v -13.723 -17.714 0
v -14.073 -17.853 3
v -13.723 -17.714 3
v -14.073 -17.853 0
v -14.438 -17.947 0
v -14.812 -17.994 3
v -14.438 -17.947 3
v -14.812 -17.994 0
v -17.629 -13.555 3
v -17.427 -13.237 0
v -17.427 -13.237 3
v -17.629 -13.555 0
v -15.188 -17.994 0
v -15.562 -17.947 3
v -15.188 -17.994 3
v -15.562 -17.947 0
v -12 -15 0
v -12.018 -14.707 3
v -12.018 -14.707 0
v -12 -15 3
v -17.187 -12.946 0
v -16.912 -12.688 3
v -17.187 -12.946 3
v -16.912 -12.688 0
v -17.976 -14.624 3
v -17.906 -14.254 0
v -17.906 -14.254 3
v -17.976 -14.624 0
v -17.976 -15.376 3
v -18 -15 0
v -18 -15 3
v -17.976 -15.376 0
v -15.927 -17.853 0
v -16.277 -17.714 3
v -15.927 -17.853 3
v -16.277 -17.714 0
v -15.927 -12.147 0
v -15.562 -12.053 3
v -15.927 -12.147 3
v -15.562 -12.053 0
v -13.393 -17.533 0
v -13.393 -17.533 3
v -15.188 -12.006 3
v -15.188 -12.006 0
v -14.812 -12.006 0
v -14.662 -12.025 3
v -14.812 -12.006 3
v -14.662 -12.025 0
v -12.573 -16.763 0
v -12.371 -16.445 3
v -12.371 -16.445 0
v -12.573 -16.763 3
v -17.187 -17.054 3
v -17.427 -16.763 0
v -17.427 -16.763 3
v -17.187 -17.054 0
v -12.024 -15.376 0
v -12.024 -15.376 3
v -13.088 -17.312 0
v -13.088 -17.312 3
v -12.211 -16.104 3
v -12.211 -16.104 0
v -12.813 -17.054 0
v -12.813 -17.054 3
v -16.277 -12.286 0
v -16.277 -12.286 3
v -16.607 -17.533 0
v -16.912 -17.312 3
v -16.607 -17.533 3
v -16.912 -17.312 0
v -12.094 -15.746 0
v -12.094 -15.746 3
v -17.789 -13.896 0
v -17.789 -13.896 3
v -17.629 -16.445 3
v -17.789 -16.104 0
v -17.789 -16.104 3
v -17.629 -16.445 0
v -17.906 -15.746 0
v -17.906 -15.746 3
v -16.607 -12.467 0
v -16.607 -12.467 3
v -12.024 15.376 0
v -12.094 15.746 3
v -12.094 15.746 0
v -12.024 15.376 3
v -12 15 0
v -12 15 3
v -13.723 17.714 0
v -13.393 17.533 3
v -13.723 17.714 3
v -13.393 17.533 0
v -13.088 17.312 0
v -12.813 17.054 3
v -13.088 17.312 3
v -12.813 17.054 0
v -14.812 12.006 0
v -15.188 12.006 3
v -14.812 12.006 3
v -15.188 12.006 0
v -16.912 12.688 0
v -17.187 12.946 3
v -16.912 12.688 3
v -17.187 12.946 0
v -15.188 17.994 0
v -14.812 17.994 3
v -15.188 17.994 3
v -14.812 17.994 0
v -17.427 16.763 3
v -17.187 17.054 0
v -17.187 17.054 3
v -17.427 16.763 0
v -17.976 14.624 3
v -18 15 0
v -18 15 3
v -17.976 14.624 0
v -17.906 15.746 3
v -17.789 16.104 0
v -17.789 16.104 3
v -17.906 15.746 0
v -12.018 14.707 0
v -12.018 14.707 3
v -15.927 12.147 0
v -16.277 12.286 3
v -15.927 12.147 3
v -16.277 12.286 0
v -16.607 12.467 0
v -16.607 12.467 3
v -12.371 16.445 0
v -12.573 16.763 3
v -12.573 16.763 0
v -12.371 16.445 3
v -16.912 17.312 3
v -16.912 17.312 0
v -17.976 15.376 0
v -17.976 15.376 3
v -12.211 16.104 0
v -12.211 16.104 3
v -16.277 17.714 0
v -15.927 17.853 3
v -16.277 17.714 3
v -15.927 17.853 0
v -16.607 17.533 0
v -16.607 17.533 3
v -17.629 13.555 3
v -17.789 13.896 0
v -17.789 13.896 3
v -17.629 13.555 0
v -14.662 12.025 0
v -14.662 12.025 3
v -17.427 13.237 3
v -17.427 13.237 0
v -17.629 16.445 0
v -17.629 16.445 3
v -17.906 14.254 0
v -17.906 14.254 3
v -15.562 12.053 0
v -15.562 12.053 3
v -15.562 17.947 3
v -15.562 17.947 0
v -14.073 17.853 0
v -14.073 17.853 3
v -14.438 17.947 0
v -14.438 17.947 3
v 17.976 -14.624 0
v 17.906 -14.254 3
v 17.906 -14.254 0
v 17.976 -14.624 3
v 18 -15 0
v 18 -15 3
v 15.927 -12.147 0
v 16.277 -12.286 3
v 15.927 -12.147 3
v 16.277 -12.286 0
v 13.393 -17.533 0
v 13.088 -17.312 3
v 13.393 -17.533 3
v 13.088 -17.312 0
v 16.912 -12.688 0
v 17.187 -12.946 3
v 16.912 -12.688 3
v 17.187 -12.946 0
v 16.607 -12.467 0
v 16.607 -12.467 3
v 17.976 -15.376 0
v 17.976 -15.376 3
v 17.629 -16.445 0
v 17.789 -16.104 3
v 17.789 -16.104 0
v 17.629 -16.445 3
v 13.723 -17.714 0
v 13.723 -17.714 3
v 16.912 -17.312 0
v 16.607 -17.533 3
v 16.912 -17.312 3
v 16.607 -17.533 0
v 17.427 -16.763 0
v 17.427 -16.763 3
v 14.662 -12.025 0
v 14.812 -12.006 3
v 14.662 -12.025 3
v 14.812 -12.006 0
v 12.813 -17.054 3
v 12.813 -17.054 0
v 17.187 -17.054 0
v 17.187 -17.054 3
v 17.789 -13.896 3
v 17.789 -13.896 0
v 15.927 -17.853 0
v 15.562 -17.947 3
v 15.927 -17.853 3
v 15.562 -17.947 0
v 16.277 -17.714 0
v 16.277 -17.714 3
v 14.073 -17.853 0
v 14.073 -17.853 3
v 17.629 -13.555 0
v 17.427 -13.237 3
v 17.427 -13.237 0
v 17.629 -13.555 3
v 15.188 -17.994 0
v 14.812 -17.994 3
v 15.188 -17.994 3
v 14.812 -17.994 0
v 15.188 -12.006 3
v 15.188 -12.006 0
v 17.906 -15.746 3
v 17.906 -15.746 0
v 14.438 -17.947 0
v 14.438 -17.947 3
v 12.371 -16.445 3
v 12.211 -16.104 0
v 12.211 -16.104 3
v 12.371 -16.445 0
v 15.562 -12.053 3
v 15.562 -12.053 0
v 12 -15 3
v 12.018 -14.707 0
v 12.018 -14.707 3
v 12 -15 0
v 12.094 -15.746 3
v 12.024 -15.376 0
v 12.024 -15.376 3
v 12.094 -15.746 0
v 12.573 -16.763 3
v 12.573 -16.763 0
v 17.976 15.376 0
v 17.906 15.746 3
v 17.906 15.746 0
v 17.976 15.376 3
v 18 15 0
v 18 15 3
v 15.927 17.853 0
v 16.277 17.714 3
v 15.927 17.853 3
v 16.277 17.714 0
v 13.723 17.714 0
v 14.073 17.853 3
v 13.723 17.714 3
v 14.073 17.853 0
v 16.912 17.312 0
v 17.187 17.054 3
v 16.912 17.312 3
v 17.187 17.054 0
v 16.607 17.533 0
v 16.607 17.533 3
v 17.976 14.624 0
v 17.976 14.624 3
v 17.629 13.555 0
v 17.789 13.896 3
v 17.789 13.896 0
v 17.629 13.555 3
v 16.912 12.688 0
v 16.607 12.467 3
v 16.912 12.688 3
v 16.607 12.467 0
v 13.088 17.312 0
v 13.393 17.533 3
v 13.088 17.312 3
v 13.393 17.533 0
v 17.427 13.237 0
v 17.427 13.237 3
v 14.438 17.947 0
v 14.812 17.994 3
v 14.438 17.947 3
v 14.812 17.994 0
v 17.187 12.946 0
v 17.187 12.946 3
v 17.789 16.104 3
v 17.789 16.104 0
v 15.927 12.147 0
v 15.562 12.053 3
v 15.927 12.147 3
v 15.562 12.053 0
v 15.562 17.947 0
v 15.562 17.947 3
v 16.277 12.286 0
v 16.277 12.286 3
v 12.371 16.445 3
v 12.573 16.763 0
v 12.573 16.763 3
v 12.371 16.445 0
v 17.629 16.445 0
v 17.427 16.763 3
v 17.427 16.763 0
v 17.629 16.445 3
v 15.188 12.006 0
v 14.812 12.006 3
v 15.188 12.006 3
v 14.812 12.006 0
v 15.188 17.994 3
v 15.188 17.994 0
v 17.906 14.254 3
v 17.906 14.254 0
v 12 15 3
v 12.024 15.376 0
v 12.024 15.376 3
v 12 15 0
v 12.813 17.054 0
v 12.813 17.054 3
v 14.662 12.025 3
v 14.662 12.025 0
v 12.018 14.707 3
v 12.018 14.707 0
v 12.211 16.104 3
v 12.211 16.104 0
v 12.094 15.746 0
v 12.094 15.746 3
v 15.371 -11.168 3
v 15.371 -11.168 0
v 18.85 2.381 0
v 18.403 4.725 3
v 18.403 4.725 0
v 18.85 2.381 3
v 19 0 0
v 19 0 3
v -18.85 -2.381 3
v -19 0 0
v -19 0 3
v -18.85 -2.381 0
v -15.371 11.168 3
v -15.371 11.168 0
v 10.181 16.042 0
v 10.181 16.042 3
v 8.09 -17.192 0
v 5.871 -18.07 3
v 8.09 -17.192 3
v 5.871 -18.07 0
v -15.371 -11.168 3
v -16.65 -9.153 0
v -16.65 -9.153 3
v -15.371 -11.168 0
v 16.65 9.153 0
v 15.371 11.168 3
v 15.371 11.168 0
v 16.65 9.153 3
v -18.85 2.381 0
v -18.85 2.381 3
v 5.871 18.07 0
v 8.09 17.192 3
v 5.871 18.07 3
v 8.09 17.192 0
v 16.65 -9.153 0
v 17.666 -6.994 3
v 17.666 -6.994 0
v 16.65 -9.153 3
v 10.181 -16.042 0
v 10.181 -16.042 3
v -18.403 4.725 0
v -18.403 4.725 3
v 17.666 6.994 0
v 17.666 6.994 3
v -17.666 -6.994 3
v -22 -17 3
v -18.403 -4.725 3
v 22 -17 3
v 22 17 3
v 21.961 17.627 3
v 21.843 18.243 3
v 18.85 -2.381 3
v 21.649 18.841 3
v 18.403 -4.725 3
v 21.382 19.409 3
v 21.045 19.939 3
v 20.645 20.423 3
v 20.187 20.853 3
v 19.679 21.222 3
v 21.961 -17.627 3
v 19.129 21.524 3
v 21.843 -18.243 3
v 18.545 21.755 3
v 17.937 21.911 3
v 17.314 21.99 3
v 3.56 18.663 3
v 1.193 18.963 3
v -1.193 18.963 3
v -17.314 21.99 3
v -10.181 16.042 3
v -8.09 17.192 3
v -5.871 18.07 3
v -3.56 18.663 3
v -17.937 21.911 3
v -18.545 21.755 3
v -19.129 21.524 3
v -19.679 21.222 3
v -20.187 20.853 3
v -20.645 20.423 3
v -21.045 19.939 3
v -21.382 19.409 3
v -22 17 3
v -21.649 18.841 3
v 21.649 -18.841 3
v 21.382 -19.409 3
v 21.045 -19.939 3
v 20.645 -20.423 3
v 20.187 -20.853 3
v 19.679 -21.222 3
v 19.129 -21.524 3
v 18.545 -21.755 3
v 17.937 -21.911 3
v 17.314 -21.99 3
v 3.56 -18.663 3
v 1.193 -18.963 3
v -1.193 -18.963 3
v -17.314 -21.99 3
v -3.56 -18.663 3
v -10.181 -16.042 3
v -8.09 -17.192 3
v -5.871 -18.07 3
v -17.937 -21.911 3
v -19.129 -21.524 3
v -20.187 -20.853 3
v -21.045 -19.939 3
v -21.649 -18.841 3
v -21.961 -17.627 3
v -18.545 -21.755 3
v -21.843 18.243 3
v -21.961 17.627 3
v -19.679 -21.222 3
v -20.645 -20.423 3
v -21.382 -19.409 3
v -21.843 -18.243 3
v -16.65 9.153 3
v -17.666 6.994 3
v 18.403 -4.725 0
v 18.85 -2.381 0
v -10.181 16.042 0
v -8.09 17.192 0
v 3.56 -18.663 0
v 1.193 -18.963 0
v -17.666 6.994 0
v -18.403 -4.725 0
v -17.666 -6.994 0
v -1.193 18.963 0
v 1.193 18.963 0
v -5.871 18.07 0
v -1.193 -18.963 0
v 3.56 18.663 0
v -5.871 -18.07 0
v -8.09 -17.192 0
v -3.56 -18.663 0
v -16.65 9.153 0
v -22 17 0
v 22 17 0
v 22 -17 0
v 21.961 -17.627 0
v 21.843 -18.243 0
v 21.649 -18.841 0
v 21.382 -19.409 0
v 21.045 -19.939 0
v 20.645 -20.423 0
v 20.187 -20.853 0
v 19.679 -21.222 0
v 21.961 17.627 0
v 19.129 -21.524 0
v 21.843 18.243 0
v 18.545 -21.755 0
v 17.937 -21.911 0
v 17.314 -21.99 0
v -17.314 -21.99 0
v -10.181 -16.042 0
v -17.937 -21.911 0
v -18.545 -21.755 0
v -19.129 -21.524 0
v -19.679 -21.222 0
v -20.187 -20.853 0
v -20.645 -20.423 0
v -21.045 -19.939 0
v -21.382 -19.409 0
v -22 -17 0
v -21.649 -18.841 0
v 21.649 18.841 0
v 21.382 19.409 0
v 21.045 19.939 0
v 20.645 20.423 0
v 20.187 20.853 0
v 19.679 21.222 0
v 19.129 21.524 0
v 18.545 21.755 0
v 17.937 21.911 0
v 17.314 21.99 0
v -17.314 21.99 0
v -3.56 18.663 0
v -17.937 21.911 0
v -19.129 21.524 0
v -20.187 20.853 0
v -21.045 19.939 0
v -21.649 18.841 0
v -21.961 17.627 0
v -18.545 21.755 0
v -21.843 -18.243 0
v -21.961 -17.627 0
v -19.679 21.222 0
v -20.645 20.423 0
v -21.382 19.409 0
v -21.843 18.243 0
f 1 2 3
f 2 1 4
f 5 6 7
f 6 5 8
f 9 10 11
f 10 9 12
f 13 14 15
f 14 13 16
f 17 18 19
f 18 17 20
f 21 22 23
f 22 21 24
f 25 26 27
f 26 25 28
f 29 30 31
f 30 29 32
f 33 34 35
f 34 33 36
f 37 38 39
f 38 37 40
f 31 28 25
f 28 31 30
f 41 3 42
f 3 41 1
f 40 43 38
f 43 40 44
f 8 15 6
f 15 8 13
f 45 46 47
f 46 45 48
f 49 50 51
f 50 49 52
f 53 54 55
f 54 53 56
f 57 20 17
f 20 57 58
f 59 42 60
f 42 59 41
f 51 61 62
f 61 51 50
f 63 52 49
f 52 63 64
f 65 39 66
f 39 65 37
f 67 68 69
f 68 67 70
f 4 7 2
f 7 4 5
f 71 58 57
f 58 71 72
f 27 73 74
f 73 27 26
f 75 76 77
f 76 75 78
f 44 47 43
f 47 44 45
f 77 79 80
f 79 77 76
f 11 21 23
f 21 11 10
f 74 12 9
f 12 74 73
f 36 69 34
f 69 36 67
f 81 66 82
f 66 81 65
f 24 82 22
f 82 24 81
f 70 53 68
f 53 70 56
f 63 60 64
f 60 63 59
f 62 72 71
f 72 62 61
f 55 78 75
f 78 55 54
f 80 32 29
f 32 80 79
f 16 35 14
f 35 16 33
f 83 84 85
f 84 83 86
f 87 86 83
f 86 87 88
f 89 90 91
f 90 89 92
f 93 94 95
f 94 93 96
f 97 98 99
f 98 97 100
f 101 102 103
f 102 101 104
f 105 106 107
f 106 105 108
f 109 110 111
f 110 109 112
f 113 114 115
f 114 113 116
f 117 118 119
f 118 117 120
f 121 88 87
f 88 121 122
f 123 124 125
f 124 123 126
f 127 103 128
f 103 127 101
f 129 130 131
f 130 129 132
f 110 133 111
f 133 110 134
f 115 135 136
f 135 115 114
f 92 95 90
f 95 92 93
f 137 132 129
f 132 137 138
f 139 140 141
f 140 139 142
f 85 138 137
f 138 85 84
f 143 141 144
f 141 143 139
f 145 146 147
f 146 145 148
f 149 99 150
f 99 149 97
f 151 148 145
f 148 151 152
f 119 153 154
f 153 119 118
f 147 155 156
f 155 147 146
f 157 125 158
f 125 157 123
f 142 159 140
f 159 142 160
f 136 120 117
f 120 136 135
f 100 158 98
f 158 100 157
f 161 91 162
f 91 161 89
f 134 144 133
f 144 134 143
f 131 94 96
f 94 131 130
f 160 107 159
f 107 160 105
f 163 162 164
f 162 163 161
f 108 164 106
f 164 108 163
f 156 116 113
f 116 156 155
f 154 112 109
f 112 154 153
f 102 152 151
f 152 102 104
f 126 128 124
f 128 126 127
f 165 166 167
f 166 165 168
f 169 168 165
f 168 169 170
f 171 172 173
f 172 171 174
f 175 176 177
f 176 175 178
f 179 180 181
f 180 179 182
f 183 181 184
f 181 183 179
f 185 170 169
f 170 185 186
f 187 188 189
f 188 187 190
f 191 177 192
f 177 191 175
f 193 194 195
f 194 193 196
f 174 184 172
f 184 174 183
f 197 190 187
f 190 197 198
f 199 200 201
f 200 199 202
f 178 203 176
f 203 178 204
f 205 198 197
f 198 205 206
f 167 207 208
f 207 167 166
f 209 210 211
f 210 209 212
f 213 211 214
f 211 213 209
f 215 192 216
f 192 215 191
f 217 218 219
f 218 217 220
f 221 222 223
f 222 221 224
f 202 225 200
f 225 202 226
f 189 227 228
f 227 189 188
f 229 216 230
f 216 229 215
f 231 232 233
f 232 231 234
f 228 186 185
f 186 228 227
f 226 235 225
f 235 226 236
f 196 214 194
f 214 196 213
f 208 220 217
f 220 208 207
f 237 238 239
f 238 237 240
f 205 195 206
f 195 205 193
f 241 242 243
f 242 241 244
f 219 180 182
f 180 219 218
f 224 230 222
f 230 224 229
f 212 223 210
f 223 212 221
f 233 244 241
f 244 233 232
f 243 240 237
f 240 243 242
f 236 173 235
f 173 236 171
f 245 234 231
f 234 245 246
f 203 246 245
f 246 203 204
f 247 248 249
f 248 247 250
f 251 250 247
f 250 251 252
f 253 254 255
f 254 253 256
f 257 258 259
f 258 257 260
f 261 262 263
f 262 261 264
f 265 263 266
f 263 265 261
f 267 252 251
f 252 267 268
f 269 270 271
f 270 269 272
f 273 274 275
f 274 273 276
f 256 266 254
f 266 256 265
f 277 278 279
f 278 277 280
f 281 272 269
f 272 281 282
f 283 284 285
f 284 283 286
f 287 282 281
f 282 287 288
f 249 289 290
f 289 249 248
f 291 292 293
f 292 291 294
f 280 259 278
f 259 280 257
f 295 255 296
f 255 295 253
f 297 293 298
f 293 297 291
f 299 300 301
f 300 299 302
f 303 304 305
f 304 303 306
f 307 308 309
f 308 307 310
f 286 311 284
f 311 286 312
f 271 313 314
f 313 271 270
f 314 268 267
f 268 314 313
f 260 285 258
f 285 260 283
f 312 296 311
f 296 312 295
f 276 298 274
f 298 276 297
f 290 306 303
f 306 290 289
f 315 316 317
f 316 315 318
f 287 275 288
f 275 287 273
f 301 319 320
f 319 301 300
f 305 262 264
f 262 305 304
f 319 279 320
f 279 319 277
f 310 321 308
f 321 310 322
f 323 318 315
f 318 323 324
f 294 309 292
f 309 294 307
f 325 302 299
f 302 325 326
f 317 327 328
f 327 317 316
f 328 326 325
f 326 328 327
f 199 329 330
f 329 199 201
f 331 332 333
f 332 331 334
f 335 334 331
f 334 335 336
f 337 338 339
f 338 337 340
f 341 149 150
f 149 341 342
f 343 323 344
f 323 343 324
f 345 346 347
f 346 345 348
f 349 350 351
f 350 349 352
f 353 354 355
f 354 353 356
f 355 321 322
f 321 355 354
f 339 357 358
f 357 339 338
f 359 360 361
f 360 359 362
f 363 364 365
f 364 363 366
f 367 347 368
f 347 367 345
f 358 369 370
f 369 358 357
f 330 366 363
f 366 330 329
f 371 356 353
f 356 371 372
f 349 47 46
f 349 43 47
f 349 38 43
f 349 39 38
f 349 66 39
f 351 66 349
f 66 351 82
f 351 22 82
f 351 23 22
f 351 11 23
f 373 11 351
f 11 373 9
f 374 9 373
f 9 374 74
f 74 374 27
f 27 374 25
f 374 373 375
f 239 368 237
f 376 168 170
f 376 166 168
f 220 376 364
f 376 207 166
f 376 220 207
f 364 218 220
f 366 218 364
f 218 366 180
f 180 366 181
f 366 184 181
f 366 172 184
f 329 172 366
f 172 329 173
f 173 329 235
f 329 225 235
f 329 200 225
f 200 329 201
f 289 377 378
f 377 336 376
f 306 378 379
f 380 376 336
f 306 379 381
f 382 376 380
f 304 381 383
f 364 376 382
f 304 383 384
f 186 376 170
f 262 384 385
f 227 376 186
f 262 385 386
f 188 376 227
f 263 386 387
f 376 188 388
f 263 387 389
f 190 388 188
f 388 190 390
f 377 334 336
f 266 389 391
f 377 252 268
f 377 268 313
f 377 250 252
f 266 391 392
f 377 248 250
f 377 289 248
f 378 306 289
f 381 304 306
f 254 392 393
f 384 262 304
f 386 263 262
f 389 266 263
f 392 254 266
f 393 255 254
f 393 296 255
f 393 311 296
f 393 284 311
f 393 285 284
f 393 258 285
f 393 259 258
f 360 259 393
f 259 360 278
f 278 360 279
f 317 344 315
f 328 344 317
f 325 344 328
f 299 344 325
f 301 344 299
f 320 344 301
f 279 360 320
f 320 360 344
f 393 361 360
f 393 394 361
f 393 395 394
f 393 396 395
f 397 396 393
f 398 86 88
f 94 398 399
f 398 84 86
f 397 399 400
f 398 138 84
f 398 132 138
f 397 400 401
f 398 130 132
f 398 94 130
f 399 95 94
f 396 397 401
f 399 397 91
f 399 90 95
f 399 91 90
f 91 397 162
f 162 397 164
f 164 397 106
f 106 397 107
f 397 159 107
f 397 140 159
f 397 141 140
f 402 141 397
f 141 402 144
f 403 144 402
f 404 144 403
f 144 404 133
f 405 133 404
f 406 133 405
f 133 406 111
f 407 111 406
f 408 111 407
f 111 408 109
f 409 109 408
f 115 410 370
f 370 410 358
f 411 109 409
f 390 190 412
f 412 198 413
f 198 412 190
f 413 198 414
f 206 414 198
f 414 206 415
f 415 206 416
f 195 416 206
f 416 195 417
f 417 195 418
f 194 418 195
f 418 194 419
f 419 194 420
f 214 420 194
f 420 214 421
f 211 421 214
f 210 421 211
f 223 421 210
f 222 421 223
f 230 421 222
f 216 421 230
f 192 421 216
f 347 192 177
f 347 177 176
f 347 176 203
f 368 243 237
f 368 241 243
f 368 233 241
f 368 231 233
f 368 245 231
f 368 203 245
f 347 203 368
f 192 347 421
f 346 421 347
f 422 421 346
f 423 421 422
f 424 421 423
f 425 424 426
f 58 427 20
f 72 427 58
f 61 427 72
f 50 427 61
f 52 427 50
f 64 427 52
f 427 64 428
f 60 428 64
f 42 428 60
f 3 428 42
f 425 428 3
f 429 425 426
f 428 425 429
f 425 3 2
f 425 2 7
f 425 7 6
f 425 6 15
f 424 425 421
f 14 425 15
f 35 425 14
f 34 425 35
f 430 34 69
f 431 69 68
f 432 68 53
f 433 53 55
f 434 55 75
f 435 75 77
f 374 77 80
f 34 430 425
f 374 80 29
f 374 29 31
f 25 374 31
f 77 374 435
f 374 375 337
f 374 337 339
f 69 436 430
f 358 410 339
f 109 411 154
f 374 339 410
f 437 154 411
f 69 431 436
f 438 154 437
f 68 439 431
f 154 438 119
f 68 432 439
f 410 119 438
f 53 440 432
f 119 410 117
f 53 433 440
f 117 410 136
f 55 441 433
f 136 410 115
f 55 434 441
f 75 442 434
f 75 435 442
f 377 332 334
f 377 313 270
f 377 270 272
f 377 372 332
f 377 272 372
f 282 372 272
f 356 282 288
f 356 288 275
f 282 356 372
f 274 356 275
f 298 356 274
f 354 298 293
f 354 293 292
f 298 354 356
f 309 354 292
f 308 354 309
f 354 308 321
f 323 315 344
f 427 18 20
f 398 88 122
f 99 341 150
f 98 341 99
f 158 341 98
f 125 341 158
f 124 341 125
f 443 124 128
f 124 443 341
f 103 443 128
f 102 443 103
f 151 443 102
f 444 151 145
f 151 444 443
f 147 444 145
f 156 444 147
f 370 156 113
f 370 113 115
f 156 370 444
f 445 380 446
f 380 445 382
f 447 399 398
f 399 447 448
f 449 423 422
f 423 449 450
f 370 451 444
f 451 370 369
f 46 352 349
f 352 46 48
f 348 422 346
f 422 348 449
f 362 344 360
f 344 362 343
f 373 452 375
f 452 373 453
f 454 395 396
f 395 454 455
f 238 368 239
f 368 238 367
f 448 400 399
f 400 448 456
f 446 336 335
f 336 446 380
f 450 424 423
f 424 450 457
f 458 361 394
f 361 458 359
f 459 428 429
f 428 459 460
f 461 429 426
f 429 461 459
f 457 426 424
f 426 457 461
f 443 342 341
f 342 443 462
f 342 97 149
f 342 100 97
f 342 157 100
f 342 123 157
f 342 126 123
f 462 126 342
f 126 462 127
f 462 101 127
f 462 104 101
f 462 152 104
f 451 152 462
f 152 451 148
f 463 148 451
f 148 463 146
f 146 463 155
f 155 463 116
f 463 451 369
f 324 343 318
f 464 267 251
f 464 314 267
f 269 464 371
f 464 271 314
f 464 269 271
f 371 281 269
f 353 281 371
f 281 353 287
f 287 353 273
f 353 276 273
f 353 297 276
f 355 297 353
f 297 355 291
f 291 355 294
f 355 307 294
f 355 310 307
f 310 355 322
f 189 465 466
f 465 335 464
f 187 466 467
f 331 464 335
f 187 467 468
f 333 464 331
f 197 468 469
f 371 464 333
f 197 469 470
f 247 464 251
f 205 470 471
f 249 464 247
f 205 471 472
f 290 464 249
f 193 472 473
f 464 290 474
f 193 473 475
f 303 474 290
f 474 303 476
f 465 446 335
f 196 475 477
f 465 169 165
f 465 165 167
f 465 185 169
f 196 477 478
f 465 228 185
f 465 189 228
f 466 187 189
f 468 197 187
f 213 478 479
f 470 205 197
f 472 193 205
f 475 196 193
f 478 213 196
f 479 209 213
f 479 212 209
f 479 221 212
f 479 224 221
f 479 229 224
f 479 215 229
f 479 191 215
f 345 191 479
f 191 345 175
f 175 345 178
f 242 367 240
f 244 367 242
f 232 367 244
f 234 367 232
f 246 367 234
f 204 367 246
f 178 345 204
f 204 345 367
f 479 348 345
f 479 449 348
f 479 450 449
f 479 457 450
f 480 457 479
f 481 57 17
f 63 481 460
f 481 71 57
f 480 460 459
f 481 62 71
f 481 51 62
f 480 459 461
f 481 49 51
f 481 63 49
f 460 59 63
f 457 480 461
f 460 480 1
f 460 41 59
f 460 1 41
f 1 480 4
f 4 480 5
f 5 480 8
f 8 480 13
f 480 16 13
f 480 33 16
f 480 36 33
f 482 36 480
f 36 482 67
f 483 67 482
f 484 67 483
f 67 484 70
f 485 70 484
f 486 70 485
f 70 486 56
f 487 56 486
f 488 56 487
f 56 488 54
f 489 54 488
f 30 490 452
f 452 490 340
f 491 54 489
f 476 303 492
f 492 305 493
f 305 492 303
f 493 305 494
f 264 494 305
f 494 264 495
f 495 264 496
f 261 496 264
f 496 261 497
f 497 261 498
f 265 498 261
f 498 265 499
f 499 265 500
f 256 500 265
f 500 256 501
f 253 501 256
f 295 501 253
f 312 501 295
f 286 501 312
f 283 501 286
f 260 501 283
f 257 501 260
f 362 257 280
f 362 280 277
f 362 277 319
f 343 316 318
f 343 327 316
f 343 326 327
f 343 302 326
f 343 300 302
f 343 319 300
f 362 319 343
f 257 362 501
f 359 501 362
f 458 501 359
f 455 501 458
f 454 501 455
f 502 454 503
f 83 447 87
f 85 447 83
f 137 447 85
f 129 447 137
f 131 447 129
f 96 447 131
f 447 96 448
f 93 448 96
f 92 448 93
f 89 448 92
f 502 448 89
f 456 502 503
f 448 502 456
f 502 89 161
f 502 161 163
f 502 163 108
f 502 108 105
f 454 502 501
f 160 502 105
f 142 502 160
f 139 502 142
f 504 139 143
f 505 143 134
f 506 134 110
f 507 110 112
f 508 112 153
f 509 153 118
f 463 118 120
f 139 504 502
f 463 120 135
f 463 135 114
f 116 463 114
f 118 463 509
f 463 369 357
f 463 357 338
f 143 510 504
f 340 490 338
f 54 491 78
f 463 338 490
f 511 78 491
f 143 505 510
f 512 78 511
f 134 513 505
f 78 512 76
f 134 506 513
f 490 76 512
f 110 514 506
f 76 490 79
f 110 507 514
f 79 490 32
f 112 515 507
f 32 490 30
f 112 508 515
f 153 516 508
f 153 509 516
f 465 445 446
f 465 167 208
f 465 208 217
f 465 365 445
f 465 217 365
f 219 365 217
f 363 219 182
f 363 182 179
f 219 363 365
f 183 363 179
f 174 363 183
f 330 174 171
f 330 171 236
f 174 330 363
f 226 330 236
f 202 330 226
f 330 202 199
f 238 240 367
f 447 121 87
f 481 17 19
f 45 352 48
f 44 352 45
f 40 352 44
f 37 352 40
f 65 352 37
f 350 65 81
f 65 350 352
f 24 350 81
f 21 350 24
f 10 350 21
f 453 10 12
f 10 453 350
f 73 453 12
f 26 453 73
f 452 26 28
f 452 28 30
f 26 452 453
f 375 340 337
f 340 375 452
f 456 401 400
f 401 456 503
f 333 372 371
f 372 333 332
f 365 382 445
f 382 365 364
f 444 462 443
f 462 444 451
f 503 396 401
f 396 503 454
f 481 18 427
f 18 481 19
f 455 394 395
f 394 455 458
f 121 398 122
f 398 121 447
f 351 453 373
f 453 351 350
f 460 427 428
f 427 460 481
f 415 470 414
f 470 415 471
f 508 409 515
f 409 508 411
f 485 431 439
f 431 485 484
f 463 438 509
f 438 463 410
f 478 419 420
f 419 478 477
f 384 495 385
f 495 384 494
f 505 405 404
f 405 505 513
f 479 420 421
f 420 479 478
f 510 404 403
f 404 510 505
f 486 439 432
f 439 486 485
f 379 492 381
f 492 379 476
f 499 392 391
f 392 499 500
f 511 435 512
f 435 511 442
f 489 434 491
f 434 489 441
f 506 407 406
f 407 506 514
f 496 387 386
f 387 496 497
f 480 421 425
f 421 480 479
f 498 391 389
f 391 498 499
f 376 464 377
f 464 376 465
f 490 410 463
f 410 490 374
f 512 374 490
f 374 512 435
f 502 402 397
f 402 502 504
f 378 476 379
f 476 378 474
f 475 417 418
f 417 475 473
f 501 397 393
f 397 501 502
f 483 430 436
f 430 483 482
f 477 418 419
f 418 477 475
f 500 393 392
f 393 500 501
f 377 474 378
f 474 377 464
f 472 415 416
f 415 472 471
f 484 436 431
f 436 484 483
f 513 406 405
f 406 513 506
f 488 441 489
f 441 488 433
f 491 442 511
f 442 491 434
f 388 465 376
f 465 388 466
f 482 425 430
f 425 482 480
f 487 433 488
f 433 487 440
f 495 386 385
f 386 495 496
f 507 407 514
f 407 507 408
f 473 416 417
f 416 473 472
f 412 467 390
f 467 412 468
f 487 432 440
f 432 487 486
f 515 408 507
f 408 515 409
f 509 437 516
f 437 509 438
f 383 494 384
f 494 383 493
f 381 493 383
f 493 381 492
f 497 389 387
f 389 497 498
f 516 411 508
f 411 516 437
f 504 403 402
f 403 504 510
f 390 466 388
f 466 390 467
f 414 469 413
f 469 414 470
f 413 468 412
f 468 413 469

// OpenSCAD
$fn = 50;


difference() {
	union() {
		hull() {
			translate(v = [-17.0000000000, 17.0000000000, 0]) {
				cylinder(h = 3, r = 5);
			}
			translate(v = [17.0000000000, 17.0000000000, 0]) {
				cylinder(h = 3, r = 5);
			}
			translate(v = [-17.0000000000, -17.0000000000, 0]) {
				cylinder(h = 3, r = 5);
			}
			translate(v = [17.0000000000, -17.0000000000, 0]) {
				cylinder(h = 3, r = 5);
			}
		}
	}
	union() {
		#translate(v = [-15.0000000000, -15.0000000000, -100.0000000000]) {
			cylinder(h = 200, r = 3.0000000000);
		}
		#translate(v = [-15.0000000000, 15.0000000000, -100.0000000000]) {
			cylinder(h = 200, r = 3.0000000000);
		}
		#translate(v = [15.0000000000, -15.0000000000, -100.0000000000]) {
			cylinder(h = 200, r = 3.0000000000);
		}
		#translate(v = [15.0000000000, 15.0000000000, -100.0000000000]) {
			cylinder(h = 200, r = 3.0000000000);
		}
		#cylinder(h = 3, r = 19.0000000000);
	}
}
